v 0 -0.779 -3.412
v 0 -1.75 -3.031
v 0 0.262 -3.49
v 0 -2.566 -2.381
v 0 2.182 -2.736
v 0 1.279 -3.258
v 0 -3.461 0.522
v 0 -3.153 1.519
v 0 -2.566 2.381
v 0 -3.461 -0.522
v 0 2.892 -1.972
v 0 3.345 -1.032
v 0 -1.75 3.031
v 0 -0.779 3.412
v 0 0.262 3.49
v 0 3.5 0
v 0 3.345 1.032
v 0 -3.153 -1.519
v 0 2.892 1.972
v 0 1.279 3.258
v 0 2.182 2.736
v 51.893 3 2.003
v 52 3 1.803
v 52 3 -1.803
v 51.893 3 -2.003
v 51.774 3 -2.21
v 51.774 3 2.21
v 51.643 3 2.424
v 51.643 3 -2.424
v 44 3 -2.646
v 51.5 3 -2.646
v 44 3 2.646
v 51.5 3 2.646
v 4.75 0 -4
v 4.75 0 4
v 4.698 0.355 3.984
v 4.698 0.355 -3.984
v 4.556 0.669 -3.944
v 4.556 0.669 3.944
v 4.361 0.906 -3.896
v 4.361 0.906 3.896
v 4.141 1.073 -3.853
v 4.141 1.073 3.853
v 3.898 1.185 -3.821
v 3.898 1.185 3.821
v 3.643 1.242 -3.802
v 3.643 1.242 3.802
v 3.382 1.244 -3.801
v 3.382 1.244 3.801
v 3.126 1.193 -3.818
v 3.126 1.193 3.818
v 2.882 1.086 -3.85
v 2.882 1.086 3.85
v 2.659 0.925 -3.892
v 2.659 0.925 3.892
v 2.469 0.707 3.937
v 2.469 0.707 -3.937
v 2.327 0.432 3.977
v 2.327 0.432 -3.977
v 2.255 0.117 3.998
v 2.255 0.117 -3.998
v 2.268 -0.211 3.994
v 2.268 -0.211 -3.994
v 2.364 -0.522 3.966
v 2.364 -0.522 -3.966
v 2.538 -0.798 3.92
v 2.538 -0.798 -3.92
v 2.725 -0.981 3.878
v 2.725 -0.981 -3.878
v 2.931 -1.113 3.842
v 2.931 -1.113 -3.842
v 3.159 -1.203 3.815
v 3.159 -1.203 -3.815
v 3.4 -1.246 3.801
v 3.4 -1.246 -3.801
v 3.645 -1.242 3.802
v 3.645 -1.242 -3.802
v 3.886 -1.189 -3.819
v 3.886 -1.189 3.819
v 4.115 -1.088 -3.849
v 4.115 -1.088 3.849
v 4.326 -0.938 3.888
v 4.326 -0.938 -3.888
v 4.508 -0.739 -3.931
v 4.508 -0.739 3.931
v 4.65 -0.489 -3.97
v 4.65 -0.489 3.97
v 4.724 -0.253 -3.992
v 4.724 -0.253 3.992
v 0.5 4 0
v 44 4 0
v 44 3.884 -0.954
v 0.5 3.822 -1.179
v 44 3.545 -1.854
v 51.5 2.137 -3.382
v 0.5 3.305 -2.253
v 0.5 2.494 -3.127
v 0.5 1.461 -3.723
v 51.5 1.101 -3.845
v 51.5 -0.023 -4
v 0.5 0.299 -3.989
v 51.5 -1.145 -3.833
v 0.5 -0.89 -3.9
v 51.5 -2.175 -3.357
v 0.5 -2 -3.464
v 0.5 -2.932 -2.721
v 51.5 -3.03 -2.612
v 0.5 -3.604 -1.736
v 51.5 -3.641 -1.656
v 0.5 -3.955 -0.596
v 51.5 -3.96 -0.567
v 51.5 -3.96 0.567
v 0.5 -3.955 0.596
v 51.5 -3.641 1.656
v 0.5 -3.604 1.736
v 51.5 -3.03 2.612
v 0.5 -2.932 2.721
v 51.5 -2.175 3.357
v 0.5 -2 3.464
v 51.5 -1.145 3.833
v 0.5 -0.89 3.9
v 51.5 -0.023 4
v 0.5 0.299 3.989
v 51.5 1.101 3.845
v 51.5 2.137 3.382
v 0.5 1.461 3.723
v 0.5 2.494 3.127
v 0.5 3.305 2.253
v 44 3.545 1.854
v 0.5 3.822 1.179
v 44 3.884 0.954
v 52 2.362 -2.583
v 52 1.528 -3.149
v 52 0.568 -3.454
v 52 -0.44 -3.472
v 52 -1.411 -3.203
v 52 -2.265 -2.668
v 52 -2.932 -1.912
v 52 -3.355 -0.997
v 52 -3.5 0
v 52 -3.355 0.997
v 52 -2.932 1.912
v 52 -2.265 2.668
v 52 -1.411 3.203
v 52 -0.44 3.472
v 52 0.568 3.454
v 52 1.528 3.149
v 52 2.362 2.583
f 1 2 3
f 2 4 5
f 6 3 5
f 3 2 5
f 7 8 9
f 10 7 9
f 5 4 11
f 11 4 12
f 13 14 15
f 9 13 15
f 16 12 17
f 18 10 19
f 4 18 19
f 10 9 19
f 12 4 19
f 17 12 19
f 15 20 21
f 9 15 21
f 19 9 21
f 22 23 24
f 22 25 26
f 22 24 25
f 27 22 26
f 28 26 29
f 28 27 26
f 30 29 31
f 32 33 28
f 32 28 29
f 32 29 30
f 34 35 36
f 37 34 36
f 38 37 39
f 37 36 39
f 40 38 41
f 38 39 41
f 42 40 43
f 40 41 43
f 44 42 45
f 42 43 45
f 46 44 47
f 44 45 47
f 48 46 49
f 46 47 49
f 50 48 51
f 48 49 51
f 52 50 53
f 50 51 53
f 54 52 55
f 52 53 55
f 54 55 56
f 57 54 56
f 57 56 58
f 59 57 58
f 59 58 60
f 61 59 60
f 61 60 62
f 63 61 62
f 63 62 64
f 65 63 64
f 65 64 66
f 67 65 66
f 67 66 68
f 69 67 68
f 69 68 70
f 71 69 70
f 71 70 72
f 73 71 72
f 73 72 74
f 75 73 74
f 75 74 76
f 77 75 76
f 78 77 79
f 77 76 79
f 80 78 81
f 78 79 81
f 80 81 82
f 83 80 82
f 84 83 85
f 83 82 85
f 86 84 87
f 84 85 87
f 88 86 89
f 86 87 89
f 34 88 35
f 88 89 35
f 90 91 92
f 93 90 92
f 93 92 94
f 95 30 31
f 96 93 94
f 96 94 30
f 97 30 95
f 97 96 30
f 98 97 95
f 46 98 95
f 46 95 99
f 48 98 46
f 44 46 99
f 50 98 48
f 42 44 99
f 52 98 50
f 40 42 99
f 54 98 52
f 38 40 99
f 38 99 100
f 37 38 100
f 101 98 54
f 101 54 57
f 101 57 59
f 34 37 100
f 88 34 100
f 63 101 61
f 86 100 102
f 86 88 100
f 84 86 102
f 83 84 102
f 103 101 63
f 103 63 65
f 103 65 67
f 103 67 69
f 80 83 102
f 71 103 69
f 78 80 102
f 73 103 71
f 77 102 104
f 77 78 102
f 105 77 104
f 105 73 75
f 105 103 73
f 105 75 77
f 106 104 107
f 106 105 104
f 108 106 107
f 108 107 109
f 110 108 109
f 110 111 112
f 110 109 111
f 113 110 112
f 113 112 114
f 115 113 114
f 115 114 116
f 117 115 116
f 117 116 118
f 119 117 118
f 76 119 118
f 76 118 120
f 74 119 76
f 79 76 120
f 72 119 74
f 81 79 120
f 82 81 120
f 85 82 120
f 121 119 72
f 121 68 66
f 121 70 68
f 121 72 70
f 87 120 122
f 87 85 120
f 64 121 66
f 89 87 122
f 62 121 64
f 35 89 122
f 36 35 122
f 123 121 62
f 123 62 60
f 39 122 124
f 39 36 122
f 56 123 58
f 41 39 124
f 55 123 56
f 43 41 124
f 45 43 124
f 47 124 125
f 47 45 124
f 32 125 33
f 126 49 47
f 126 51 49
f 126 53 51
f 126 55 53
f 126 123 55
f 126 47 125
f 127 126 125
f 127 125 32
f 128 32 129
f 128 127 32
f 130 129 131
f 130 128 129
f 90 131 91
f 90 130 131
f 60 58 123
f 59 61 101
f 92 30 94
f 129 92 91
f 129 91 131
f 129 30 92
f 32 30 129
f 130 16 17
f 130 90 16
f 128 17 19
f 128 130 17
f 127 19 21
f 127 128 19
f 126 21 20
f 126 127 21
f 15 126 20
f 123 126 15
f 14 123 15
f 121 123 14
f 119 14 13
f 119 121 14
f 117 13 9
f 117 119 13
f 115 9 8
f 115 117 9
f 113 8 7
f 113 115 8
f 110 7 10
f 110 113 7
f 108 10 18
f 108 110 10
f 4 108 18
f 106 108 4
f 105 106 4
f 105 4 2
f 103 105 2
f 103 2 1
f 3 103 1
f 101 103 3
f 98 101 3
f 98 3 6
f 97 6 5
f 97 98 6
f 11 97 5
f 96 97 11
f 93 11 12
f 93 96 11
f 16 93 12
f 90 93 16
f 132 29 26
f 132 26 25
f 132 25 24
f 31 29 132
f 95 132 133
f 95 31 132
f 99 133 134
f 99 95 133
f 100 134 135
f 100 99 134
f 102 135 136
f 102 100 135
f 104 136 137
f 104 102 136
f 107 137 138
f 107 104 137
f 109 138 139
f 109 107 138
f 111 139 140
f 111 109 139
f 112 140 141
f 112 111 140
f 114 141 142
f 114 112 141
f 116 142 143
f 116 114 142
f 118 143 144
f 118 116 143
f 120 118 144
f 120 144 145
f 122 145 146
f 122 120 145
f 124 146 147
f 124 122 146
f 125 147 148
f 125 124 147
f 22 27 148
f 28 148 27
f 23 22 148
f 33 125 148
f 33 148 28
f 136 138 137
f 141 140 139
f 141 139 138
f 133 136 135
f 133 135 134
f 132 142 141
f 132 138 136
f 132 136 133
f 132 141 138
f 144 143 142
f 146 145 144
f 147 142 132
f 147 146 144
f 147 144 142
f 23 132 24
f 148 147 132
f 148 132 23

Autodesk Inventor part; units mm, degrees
ref_plane "YZ Plane" through (0, 0, 0) normal (1, 0, 0) x (0, 1, 0)
ref_plane "XZ Plane" through (0, 0, 0) normal (0, 1, 0) x (-1, 0, 0)
sketch "Sketch1" plane through (0, 0, 0) normal (1, 0, 0) x (0, 1, 0)
  circle A0 centre (0, 0) radius 4
  dimension "d0" = 8
extrude "Extrusion1" add sketch "Sketch1" along normal blind 52
chamfer "Chamfer1" distance 0.5 angle 45 2 edges at (0, -4, 0) (52, -4, 0)
ref_plane "Work Plane1" through (0, 0, 5.5) normal (0, 0, 1) x (1, 0, 0)
sketch "Sketch2" plane through (0, 0, 5.5) normal (0, 0, 1) x (1, 0, 0)
  line L0 (0, 0) -> (3.5, 0) construction
  circle A0 centre (3.5, 0) radius 1.25
  dimension "d7" = 3.5
  dimension "d8" = 2.5
extrude "Extrusion2" cut sketch "Sketch2" against normal blind 52
sketch "Sketch3" plane through (0, 0, 5.5) normal (0, 0, 1) x (1, 0, 0)
  line L0 (52, 3.5) -> (52, -3.5) construction
  line L1 (52, 0) -> (52, 3) construction
  line L2 (52, 3) -> (44, 3) construction
  line L3 (44, 3) -> (44, 4) construction
  line L4 (0.5, 4) -> (51.5, 4) construction
  line L5 (44, 4) -> (52, 4)
  line L6 (52, 4) -> (52, 3)
  line L7 (52, 3) -> (44, 3)
  line L8 (44, 3) -> (44, 4)
  point P0 (0, 0)
  dimension "d11" = 3
  dimension "d12" = 8
extrude "Extrusion3" cut sketch "Sketch3" against normal blind 52
properties part number "Crankshaft outer rod" material "Steel, Alloy"
